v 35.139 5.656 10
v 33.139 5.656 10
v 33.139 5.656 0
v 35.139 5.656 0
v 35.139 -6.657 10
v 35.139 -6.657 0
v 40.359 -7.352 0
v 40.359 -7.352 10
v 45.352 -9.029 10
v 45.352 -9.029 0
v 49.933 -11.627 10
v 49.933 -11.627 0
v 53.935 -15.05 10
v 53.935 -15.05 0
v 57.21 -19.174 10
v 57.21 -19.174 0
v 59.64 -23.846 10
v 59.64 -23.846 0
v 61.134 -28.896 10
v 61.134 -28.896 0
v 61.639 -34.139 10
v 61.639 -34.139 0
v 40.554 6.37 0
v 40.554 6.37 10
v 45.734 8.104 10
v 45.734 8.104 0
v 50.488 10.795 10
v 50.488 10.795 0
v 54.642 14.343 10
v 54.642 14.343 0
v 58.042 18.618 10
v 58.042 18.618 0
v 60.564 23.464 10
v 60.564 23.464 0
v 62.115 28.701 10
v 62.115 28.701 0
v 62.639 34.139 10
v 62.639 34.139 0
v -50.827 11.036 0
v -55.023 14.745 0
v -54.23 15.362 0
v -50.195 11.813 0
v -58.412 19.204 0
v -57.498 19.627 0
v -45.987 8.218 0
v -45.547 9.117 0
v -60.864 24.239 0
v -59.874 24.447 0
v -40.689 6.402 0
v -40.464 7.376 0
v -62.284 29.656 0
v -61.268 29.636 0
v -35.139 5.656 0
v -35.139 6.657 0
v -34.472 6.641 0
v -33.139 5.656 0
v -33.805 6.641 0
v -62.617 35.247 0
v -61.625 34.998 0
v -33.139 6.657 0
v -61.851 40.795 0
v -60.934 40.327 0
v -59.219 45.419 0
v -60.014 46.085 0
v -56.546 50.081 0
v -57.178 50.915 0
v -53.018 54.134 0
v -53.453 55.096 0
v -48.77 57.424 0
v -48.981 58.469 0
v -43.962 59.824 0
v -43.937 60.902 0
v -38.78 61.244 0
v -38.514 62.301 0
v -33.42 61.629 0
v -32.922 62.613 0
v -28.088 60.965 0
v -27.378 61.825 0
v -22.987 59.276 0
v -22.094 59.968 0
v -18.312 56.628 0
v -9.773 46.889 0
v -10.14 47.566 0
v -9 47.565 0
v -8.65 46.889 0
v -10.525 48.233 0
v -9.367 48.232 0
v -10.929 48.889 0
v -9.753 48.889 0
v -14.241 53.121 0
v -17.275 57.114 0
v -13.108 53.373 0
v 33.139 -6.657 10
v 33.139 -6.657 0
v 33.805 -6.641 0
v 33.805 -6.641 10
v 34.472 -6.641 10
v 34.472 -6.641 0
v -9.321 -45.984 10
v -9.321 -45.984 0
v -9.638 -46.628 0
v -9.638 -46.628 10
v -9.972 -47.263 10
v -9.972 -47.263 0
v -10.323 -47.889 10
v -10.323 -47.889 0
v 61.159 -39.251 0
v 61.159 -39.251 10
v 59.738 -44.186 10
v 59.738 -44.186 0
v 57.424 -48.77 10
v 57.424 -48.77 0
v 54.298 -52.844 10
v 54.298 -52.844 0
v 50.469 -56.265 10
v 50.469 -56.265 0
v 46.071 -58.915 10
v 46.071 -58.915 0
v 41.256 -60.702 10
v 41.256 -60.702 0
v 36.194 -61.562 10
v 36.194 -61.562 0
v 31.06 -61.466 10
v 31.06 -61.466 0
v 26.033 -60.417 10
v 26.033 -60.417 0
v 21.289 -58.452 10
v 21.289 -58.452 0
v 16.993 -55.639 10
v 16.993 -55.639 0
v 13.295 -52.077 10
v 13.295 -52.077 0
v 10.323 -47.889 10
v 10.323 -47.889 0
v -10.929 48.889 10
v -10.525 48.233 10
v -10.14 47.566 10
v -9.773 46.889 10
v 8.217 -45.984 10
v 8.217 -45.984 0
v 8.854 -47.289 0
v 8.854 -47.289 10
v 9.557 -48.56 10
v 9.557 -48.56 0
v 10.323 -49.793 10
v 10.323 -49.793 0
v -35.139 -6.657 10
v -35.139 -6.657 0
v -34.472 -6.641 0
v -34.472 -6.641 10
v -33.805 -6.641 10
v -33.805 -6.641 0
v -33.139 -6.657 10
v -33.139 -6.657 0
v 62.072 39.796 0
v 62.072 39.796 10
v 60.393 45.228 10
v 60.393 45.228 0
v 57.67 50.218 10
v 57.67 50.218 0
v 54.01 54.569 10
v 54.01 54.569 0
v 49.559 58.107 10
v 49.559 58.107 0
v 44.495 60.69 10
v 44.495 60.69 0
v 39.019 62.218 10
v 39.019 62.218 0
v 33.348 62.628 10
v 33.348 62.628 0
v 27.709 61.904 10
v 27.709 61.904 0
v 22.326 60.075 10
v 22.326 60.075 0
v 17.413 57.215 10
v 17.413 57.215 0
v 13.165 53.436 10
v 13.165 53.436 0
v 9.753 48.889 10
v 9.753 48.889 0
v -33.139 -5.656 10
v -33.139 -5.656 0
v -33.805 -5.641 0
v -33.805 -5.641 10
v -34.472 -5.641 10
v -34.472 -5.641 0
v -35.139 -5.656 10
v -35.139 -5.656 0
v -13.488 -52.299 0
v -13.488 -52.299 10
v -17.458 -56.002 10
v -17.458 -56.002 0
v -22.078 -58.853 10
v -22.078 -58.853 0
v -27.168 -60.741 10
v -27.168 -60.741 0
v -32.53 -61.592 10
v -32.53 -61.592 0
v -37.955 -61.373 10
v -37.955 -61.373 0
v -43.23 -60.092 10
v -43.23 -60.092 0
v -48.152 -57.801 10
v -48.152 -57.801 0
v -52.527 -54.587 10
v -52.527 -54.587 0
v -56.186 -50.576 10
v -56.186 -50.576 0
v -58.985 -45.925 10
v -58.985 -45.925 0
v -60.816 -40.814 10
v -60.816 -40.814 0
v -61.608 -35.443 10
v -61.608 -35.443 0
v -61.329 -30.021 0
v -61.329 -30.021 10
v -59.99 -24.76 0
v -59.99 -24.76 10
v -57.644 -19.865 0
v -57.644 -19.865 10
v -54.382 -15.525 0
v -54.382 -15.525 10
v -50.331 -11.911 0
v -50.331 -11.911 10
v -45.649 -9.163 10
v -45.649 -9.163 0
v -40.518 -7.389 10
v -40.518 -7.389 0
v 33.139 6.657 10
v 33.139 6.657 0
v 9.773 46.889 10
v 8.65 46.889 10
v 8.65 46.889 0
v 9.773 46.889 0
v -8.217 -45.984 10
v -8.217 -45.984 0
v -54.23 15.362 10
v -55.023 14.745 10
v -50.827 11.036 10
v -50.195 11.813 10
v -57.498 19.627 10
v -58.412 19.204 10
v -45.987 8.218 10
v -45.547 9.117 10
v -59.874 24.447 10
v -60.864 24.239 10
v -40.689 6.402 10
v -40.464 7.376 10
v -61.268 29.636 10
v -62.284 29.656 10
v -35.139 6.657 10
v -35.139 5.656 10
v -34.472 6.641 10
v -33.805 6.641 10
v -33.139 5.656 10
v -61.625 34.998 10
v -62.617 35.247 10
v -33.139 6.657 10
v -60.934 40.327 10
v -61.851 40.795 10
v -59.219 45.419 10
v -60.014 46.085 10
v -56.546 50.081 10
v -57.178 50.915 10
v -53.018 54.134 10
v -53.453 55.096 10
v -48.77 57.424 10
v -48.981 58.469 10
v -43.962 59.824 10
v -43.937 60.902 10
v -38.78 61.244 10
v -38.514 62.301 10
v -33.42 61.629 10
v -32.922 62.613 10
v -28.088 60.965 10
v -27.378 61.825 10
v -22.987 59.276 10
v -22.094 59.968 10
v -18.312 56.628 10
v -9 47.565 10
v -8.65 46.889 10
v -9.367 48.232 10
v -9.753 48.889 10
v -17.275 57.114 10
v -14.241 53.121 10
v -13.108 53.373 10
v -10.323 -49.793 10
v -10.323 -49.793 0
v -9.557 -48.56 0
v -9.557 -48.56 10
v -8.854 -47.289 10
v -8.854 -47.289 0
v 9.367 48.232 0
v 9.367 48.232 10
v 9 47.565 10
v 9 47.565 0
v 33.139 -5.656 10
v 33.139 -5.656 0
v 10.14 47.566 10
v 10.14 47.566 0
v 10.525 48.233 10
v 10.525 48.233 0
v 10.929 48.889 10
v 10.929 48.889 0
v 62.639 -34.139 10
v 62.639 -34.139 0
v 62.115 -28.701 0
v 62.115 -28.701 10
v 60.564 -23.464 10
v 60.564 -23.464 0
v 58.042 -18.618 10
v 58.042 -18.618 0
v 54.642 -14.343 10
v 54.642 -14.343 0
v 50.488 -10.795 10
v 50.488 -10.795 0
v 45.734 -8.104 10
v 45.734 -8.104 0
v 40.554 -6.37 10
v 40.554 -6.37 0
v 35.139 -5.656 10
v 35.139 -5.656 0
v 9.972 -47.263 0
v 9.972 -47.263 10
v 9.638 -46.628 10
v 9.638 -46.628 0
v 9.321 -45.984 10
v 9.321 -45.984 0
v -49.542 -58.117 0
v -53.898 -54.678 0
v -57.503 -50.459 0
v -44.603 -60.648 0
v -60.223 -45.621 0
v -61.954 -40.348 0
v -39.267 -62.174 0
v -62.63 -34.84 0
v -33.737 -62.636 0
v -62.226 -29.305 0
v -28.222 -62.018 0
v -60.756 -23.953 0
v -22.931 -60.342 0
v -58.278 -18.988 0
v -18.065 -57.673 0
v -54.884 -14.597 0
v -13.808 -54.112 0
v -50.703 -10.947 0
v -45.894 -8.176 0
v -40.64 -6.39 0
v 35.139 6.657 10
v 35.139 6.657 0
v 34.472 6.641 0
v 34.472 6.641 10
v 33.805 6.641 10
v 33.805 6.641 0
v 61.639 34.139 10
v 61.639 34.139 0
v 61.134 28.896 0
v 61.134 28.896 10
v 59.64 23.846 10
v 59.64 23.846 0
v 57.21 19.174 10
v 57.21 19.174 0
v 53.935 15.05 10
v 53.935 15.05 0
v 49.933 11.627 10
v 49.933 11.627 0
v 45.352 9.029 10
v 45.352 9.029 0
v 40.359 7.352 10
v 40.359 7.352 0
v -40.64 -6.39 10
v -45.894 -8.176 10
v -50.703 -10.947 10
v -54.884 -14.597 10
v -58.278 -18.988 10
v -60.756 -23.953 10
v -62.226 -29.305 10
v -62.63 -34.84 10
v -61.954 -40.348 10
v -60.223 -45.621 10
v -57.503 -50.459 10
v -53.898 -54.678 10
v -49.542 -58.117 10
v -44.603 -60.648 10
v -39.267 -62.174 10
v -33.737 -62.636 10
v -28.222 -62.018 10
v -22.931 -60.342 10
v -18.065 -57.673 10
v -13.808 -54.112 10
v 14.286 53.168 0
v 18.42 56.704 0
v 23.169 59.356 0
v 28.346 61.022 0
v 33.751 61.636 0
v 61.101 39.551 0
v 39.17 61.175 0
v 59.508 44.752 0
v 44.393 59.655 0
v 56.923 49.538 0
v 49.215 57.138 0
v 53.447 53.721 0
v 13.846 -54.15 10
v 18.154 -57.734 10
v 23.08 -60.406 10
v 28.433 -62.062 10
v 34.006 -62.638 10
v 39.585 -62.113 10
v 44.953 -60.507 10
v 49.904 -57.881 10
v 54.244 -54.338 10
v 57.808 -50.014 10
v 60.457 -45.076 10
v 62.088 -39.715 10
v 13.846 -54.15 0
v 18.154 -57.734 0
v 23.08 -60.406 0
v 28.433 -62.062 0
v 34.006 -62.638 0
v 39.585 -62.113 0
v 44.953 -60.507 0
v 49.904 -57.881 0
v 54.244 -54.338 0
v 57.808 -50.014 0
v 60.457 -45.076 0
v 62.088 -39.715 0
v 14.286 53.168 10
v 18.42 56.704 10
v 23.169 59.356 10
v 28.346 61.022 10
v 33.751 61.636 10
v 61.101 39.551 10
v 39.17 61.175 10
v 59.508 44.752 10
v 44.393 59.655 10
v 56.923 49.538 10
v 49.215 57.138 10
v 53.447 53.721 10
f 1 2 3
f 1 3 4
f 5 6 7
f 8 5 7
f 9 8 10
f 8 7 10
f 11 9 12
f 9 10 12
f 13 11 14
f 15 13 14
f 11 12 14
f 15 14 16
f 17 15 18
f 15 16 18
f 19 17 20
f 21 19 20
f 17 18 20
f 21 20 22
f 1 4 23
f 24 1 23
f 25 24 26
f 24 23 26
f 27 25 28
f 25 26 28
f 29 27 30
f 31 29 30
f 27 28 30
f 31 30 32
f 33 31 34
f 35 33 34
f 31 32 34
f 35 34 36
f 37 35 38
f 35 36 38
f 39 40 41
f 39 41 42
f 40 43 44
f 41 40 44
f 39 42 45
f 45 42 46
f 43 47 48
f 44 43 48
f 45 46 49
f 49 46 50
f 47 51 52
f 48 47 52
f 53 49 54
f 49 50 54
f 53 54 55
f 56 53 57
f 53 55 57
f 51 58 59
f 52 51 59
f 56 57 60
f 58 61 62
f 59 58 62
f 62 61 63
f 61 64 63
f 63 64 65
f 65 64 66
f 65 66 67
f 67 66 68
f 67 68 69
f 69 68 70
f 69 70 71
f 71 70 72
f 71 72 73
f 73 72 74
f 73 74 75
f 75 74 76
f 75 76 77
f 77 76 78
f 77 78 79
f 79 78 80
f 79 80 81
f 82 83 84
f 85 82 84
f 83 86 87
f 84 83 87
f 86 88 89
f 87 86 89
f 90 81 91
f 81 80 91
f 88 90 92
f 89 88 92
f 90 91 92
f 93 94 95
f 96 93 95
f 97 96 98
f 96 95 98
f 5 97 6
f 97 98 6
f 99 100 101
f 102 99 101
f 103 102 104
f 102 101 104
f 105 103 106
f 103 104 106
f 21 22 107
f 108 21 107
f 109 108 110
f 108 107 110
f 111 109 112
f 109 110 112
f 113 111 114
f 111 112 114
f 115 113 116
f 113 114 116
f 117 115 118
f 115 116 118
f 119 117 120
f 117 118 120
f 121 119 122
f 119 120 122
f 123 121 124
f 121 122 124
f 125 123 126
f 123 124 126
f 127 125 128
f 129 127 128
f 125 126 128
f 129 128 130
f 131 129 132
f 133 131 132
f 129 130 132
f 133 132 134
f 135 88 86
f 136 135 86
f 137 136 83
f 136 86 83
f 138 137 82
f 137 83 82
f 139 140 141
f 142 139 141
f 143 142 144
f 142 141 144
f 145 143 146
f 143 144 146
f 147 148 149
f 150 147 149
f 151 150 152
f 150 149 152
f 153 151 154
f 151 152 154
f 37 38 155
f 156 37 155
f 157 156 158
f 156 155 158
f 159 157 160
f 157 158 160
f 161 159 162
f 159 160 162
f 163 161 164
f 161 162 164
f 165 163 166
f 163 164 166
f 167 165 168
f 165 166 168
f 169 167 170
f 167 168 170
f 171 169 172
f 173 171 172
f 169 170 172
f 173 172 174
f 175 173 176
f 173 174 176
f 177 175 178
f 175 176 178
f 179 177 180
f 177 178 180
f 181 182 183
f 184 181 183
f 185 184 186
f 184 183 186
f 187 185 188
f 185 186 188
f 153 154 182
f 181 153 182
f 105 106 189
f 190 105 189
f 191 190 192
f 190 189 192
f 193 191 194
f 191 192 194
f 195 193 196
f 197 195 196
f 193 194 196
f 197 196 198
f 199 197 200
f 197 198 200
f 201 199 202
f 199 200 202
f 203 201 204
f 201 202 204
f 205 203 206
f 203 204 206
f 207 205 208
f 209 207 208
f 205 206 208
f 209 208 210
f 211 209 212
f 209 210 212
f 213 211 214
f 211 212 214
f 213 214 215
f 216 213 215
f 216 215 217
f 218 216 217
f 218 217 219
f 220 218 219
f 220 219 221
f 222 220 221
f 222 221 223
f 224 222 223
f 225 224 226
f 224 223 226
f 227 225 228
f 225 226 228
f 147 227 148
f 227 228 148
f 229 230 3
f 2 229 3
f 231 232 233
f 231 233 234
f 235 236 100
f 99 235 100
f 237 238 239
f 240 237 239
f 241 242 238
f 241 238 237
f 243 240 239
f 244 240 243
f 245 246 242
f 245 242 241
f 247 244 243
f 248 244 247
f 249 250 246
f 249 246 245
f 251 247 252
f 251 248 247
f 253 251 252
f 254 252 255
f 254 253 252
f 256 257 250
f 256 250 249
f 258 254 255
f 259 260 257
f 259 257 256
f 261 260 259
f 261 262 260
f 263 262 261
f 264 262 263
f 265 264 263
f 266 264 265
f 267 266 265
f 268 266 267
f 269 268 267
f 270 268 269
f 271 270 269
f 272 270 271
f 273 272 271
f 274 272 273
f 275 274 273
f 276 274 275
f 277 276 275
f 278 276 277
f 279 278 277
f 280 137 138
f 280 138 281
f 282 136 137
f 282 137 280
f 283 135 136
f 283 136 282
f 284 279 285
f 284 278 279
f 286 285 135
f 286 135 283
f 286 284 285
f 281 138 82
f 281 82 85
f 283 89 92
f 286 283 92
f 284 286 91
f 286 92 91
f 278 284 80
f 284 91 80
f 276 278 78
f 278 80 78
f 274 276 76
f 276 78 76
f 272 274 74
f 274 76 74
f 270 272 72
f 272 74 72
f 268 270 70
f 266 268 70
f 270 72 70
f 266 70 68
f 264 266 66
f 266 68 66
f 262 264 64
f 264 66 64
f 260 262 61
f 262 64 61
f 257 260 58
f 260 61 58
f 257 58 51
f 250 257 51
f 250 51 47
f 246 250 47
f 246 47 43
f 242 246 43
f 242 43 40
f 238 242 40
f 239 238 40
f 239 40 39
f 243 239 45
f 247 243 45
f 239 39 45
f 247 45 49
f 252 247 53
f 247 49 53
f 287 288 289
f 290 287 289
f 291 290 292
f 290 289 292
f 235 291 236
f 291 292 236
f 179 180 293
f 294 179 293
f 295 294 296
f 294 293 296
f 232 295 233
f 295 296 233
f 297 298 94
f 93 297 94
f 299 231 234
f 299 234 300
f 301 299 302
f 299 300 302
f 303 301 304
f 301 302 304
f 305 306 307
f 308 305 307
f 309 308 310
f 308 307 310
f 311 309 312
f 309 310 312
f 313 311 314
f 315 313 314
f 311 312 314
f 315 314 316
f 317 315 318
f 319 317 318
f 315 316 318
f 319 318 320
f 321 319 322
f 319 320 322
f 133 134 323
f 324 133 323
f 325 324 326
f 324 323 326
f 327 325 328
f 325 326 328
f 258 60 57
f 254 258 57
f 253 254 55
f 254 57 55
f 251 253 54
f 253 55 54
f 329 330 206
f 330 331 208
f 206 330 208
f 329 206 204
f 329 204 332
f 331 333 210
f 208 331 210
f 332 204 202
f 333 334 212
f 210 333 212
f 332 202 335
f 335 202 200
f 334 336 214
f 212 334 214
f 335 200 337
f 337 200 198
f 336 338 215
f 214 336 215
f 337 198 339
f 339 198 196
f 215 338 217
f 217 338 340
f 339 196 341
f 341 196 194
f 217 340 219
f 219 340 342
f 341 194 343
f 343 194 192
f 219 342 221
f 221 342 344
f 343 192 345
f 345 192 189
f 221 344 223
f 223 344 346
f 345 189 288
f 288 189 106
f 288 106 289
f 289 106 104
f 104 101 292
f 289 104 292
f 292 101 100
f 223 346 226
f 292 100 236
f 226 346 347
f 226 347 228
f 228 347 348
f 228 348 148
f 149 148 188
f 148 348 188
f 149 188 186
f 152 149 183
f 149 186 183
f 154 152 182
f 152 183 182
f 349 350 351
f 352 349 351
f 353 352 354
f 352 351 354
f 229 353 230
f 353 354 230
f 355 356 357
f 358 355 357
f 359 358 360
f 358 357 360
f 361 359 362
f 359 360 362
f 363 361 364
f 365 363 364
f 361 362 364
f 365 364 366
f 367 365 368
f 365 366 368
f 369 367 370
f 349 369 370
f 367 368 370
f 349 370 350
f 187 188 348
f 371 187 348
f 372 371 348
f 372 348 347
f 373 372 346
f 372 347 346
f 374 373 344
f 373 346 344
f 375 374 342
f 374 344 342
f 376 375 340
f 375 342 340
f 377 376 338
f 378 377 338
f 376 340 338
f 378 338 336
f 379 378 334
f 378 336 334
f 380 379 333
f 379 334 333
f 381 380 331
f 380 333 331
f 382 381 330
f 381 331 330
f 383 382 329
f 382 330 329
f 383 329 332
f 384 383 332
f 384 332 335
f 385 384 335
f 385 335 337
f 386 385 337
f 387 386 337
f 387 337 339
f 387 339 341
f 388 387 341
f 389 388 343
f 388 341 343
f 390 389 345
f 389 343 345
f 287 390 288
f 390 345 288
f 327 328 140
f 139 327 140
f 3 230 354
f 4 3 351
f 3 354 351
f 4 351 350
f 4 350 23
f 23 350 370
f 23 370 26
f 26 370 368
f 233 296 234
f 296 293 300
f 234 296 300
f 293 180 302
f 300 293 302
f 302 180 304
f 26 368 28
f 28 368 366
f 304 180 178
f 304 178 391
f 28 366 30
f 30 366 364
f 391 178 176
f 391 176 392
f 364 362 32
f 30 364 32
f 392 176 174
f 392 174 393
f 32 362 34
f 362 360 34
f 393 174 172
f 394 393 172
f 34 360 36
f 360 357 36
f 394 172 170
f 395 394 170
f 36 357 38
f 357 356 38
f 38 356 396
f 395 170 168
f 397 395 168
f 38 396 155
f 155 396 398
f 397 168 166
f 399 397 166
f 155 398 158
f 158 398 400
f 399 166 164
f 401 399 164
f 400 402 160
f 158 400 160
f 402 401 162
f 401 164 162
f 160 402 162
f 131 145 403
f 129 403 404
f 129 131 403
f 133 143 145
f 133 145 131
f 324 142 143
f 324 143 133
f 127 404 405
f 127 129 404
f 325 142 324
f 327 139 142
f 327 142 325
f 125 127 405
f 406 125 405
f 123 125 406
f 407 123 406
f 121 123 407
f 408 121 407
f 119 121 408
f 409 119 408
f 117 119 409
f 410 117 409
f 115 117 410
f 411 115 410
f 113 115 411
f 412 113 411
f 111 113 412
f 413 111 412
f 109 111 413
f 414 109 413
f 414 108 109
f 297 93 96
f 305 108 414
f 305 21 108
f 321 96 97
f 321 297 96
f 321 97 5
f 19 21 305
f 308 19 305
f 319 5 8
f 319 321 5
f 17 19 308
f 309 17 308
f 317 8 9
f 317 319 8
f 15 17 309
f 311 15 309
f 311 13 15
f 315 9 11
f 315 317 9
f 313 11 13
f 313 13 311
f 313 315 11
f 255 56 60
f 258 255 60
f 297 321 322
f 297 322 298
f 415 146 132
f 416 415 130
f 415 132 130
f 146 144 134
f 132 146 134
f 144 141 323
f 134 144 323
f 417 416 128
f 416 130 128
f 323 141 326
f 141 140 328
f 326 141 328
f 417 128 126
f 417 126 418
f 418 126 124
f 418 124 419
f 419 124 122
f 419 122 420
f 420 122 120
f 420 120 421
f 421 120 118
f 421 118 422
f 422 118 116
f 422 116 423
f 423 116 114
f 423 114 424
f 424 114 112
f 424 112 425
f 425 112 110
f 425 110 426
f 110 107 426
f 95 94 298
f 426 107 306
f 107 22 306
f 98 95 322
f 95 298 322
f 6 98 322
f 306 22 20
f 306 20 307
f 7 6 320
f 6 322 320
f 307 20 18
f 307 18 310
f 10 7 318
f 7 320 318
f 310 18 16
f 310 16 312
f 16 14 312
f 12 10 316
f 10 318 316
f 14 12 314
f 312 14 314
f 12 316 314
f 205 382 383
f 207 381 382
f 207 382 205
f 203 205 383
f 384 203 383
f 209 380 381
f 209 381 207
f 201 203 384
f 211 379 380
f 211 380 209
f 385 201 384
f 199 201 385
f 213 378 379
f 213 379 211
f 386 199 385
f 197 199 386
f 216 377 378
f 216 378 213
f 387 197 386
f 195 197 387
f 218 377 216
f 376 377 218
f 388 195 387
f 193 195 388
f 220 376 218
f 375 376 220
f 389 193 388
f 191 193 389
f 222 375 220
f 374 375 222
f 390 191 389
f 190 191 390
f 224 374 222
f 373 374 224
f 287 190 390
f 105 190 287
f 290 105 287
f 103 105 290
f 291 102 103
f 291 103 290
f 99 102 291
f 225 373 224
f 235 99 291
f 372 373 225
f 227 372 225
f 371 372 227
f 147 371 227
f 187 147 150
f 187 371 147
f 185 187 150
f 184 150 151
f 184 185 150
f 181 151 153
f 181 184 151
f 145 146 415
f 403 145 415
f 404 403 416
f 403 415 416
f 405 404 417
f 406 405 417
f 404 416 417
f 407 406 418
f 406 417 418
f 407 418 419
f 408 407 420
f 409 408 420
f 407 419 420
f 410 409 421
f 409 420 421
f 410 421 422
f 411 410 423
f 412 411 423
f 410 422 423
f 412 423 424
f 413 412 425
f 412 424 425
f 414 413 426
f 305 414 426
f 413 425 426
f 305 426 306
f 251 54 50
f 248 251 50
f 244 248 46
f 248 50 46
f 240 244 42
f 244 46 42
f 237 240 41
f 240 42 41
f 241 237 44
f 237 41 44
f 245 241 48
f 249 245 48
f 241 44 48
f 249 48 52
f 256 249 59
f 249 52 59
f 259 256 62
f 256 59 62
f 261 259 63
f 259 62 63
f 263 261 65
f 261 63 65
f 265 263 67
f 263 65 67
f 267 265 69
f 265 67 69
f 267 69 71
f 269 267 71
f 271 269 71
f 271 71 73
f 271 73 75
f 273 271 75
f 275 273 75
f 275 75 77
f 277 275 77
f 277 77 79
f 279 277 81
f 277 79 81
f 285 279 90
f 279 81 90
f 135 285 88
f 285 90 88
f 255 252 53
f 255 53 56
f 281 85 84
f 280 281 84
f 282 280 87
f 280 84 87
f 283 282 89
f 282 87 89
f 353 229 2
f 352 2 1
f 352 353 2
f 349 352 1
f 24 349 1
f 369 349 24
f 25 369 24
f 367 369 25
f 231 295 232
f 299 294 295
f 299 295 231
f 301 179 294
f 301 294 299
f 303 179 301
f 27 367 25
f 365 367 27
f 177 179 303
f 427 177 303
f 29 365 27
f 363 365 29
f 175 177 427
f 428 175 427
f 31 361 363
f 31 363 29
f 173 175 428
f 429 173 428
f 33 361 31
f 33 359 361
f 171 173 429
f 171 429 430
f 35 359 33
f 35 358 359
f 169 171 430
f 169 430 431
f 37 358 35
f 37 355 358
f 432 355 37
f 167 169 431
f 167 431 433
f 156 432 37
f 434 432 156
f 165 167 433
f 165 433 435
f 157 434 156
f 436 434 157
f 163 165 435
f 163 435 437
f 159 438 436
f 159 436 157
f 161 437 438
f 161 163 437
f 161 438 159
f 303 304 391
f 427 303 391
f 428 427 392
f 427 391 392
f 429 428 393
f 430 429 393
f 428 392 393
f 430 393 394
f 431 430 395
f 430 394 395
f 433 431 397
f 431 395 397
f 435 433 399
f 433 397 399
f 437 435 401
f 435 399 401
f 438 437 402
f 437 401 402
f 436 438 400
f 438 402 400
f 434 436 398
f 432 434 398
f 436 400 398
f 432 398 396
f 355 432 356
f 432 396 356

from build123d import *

# Parameters (mm, degrees)
F1_DEPTH = 10


with BuildPart() as f1:
    # F0 (on Top) → F1 (new body)
    with BuildSketch(Plane.XY):
        with BuildLine():
            ThreePointArc((-35.1387531032, -6.6569409359), (-34.1387531032, -6.6387531032), (-33.1387531032, -6.6569409359))
            Line((-33.1387531032, -6.6569409359), (-33.1387531032, -5.6563023659))
            ThreePointArc((-33.1387531032, -5.6563023659), (-34.1387531032, -5.6387531032), (-35.1387531032, -5.6563023659))
            Line((-35.1387531032, -5.6563023659), (-35.1387531032, -6.6569409359))
        make_face()
        with BuildLine():
            Line((-8.2170735426, -45.9842808987), (-9.3207461074, -45.9842808987))
            ThreePointArc((-9.3207461074, -45.9842808987), (-9.8032628947, -46.9463257191), (-10.3230544991, -47.8887531032))
            Line((-10.3230544991, -47.8887531032), (-10.3230544991, -49.7932253077))
            ThreePointArc((-10.3230544991, -49.7932253077), (-9.1972473136, -47.9290137587), (-8.2170735426, -45.9842808987))
        make_face()
        with BuildLine():
            ThreePointArc((-10.3230544991, -47.8887531032), (-57.7004722542, -48.3195637518), (-35.1387531032, -6.6569409359))
            Line((-35.1387531032, -6.6569409359), (-35.1387531032, -5.6563023659))
            ThreePointArc((-35.1387531032, -5.6563023659), (-58.9813781132, -48.1063578589), (-10.3230544991, -49.7932253077))
            Line((-10.3230544991, -49.7932253077), (-10.3230544991, -47.8887531032))
        make_face()
    extrude(amount=F1_DEPTH)


with BuildPart() as f1b:
    # F0 (on Top) → F1, piece 2 (new body)
    with BuildSketch(Plane.XY):
        with BuildLine():
            Line((9.3207461074, -45.9842808987), (8.2170735426, -45.9842808987))
            ThreePointArc((8.2170735426, -45.9842808987), (9.1972473136, -47.9290137587), (10.3230544991, -49.7932253077))
            Line((10.3230544991, -49.7932253077), (10.3230544991, -47.8887531032))
            ThreePointArc((10.3230544991, -47.8887531032), (9.8032628947, -46.9463257191), (9.3207461074, -45.9842808987))
        make_face()
        with BuildLine():
            Line((10.3230544991, -47.8887531032), (10.3230544991, -49.7932253077))
            ThreePointArc((10.3230544991, -49.7932253077), (42.3088996681, -61.4425752735), (62.6387531032, -34.1387531032))
            ThreePointArc((62.6387531032, -34.1387531032), (54.641801657, -14.3429202084), (35.1387531032, -5.6563023659))
            Line((35.1387531032, -5.6563023659), (35.1387531032, -6.6569409359))
            ThreePointArc((35.1387531032, -6.6569409359), (53.934585998, -15.0501439344), (61.6387531032, -34.1387531032))
            ThreePointArc((61.6387531032, -34.1387531032), (41.2562768435, -60.7017133261), (10.3230544991, -47.8887531032))
        make_face()
        with BuildLine():
            Line((35.1387531032, -5.6563023659), (33.1387531032, -5.6563023659))
            Line((33.1387531032, -5.6563023659), (33.1387531032, -6.6569409359))
            ThreePointArc((33.1387531032, -6.6569409359), (34.1387531032, -6.6387531032), (35.1387531032, -6.6569409359))
            Line((35.1387531032, -6.6569409359), (35.1387531032, -5.6563023659))
        make_face()
    extrude(amount=F1_DEPTH)


with BuildPart() as f1c:
    # F0 (on Top) → F1, piece 3 (new body)
    with BuildSketch(Plane.XY):
        with BuildLine():
            Line((-35.1387531032, 5.6563023659), (-33.1387531032, 5.6563023659))
            Line((-33.1387531032, 5.6563023659), (-33.1387531032, 6.6569409359))
            ThreePointArc((-33.1387531032, 6.6569409359), (-34.1387531032, 6.6387531032), (-35.1387531032, 6.6569409359))
            Line((-35.1387531032, 6.6569409359), (-35.1387531032, 5.6563023659))
        make_face()
        with BuildLine():
            ThreePointArc((-9.7525377347, 48.8887531032), (-58.7149604286, 48.5699704287), (-35.1387531032, 5.6563023659))
            Line((-35.1387531032, 5.6563023659), (-35.1387531032, 6.6569409359))
            ThreePointArc((-35.1387531032, 6.6569409359), (-57.996635313, 47.8154287396), (-10.9291107104, 48.8887531032))
            Line((-10.9291107104, 48.8887531032), (-9.7525377347, 48.8887531032))
        make_face()
        with BuildLine():
            ThreePointArc((-8.6497849012, 46.8887531032), (-9.1811193202, 47.8998037881), (-9.7525377347, 48.8887531032))
            Line((-9.7525377347, 48.8887531032), (-10.9291107104, 48.8887531032))
            ThreePointArc((-10.9291107104, 48.8887531032), (-10.3300702173, 47.9008975305), (-9.7730497479, 46.8887531032))
            Line((-9.7730497479, 46.8887531032), (-8.6497849012, 46.8887531032))
        make_face()
    extrude(amount=F1_DEPTH)


with BuildPart() as f1d:
    # F0 (on Top) → F1, piece 4 (new body)
    with BuildSketch(Plane.XY):
        with BuildLine():
            Line((33.1387531032, 6.6569409359), (33.1387531032, 5.6563023659))
            Line((33.1387531032, 5.6563023659), (35.1387531032, 5.6563023659))
            Line((35.1387531032, 5.6563023659), (35.1387531032, 6.6569409359))
            ThreePointArc((35.1387531032, 6.6569409359), (34.1387531032, 6.6387531032), (33.1387531032, 6.6569409359))
        make_face()
        with BuildLine():
            Line((10.9291107104, 48.8887531032), (9.7525377347, 48.8887531032))
            ThreePointArc((9.7525377347, 48.8887531032), (9.1811193202, 47.8998037881), (8.6497849012, 46.8887531032))
            Line((8.6497849012, 46.8887531032), (9.7730497479, 46.8887531032))
            ThreePointArc((9.7730497479, 46.8887531032), (10.3300702173, 47.9008975305), (10.9291107104, 48.8887531032))
        make_face()
        with BuildLine():
            ThreePointArc((62.6387531032, 34.1387531032), (41.7952164512, 61.591049346), (9.7525377347, 48.8887531032))
            Line((9.7525377347, 48.8887531032), (10.9291107104, 48.8887531032))
            ThreePointArc((10.9291107104, 48.8887531032), (41.8194052304, 60.5443885415), (61.6387531032, 34.1387531032))
            ThreePointArc((61.6387531032, 34.1387531032), (53.934585998, 15.0501439344), (35.1387531032, 6.6569409359))
            Line((35.1387531032, 6.6569409359), (35.1387531032, 5.6563023659))
            ThreePointArc((35.1387531032, 5.6563023659), (54.641801657, 14.3429202084), (62.6387531032, 34.1387531032))
        make_face()
    extrude(amount=F1_DEPTH)


solid = Compound([f1.part, f1b.part, f1c.part, f1d.part])
